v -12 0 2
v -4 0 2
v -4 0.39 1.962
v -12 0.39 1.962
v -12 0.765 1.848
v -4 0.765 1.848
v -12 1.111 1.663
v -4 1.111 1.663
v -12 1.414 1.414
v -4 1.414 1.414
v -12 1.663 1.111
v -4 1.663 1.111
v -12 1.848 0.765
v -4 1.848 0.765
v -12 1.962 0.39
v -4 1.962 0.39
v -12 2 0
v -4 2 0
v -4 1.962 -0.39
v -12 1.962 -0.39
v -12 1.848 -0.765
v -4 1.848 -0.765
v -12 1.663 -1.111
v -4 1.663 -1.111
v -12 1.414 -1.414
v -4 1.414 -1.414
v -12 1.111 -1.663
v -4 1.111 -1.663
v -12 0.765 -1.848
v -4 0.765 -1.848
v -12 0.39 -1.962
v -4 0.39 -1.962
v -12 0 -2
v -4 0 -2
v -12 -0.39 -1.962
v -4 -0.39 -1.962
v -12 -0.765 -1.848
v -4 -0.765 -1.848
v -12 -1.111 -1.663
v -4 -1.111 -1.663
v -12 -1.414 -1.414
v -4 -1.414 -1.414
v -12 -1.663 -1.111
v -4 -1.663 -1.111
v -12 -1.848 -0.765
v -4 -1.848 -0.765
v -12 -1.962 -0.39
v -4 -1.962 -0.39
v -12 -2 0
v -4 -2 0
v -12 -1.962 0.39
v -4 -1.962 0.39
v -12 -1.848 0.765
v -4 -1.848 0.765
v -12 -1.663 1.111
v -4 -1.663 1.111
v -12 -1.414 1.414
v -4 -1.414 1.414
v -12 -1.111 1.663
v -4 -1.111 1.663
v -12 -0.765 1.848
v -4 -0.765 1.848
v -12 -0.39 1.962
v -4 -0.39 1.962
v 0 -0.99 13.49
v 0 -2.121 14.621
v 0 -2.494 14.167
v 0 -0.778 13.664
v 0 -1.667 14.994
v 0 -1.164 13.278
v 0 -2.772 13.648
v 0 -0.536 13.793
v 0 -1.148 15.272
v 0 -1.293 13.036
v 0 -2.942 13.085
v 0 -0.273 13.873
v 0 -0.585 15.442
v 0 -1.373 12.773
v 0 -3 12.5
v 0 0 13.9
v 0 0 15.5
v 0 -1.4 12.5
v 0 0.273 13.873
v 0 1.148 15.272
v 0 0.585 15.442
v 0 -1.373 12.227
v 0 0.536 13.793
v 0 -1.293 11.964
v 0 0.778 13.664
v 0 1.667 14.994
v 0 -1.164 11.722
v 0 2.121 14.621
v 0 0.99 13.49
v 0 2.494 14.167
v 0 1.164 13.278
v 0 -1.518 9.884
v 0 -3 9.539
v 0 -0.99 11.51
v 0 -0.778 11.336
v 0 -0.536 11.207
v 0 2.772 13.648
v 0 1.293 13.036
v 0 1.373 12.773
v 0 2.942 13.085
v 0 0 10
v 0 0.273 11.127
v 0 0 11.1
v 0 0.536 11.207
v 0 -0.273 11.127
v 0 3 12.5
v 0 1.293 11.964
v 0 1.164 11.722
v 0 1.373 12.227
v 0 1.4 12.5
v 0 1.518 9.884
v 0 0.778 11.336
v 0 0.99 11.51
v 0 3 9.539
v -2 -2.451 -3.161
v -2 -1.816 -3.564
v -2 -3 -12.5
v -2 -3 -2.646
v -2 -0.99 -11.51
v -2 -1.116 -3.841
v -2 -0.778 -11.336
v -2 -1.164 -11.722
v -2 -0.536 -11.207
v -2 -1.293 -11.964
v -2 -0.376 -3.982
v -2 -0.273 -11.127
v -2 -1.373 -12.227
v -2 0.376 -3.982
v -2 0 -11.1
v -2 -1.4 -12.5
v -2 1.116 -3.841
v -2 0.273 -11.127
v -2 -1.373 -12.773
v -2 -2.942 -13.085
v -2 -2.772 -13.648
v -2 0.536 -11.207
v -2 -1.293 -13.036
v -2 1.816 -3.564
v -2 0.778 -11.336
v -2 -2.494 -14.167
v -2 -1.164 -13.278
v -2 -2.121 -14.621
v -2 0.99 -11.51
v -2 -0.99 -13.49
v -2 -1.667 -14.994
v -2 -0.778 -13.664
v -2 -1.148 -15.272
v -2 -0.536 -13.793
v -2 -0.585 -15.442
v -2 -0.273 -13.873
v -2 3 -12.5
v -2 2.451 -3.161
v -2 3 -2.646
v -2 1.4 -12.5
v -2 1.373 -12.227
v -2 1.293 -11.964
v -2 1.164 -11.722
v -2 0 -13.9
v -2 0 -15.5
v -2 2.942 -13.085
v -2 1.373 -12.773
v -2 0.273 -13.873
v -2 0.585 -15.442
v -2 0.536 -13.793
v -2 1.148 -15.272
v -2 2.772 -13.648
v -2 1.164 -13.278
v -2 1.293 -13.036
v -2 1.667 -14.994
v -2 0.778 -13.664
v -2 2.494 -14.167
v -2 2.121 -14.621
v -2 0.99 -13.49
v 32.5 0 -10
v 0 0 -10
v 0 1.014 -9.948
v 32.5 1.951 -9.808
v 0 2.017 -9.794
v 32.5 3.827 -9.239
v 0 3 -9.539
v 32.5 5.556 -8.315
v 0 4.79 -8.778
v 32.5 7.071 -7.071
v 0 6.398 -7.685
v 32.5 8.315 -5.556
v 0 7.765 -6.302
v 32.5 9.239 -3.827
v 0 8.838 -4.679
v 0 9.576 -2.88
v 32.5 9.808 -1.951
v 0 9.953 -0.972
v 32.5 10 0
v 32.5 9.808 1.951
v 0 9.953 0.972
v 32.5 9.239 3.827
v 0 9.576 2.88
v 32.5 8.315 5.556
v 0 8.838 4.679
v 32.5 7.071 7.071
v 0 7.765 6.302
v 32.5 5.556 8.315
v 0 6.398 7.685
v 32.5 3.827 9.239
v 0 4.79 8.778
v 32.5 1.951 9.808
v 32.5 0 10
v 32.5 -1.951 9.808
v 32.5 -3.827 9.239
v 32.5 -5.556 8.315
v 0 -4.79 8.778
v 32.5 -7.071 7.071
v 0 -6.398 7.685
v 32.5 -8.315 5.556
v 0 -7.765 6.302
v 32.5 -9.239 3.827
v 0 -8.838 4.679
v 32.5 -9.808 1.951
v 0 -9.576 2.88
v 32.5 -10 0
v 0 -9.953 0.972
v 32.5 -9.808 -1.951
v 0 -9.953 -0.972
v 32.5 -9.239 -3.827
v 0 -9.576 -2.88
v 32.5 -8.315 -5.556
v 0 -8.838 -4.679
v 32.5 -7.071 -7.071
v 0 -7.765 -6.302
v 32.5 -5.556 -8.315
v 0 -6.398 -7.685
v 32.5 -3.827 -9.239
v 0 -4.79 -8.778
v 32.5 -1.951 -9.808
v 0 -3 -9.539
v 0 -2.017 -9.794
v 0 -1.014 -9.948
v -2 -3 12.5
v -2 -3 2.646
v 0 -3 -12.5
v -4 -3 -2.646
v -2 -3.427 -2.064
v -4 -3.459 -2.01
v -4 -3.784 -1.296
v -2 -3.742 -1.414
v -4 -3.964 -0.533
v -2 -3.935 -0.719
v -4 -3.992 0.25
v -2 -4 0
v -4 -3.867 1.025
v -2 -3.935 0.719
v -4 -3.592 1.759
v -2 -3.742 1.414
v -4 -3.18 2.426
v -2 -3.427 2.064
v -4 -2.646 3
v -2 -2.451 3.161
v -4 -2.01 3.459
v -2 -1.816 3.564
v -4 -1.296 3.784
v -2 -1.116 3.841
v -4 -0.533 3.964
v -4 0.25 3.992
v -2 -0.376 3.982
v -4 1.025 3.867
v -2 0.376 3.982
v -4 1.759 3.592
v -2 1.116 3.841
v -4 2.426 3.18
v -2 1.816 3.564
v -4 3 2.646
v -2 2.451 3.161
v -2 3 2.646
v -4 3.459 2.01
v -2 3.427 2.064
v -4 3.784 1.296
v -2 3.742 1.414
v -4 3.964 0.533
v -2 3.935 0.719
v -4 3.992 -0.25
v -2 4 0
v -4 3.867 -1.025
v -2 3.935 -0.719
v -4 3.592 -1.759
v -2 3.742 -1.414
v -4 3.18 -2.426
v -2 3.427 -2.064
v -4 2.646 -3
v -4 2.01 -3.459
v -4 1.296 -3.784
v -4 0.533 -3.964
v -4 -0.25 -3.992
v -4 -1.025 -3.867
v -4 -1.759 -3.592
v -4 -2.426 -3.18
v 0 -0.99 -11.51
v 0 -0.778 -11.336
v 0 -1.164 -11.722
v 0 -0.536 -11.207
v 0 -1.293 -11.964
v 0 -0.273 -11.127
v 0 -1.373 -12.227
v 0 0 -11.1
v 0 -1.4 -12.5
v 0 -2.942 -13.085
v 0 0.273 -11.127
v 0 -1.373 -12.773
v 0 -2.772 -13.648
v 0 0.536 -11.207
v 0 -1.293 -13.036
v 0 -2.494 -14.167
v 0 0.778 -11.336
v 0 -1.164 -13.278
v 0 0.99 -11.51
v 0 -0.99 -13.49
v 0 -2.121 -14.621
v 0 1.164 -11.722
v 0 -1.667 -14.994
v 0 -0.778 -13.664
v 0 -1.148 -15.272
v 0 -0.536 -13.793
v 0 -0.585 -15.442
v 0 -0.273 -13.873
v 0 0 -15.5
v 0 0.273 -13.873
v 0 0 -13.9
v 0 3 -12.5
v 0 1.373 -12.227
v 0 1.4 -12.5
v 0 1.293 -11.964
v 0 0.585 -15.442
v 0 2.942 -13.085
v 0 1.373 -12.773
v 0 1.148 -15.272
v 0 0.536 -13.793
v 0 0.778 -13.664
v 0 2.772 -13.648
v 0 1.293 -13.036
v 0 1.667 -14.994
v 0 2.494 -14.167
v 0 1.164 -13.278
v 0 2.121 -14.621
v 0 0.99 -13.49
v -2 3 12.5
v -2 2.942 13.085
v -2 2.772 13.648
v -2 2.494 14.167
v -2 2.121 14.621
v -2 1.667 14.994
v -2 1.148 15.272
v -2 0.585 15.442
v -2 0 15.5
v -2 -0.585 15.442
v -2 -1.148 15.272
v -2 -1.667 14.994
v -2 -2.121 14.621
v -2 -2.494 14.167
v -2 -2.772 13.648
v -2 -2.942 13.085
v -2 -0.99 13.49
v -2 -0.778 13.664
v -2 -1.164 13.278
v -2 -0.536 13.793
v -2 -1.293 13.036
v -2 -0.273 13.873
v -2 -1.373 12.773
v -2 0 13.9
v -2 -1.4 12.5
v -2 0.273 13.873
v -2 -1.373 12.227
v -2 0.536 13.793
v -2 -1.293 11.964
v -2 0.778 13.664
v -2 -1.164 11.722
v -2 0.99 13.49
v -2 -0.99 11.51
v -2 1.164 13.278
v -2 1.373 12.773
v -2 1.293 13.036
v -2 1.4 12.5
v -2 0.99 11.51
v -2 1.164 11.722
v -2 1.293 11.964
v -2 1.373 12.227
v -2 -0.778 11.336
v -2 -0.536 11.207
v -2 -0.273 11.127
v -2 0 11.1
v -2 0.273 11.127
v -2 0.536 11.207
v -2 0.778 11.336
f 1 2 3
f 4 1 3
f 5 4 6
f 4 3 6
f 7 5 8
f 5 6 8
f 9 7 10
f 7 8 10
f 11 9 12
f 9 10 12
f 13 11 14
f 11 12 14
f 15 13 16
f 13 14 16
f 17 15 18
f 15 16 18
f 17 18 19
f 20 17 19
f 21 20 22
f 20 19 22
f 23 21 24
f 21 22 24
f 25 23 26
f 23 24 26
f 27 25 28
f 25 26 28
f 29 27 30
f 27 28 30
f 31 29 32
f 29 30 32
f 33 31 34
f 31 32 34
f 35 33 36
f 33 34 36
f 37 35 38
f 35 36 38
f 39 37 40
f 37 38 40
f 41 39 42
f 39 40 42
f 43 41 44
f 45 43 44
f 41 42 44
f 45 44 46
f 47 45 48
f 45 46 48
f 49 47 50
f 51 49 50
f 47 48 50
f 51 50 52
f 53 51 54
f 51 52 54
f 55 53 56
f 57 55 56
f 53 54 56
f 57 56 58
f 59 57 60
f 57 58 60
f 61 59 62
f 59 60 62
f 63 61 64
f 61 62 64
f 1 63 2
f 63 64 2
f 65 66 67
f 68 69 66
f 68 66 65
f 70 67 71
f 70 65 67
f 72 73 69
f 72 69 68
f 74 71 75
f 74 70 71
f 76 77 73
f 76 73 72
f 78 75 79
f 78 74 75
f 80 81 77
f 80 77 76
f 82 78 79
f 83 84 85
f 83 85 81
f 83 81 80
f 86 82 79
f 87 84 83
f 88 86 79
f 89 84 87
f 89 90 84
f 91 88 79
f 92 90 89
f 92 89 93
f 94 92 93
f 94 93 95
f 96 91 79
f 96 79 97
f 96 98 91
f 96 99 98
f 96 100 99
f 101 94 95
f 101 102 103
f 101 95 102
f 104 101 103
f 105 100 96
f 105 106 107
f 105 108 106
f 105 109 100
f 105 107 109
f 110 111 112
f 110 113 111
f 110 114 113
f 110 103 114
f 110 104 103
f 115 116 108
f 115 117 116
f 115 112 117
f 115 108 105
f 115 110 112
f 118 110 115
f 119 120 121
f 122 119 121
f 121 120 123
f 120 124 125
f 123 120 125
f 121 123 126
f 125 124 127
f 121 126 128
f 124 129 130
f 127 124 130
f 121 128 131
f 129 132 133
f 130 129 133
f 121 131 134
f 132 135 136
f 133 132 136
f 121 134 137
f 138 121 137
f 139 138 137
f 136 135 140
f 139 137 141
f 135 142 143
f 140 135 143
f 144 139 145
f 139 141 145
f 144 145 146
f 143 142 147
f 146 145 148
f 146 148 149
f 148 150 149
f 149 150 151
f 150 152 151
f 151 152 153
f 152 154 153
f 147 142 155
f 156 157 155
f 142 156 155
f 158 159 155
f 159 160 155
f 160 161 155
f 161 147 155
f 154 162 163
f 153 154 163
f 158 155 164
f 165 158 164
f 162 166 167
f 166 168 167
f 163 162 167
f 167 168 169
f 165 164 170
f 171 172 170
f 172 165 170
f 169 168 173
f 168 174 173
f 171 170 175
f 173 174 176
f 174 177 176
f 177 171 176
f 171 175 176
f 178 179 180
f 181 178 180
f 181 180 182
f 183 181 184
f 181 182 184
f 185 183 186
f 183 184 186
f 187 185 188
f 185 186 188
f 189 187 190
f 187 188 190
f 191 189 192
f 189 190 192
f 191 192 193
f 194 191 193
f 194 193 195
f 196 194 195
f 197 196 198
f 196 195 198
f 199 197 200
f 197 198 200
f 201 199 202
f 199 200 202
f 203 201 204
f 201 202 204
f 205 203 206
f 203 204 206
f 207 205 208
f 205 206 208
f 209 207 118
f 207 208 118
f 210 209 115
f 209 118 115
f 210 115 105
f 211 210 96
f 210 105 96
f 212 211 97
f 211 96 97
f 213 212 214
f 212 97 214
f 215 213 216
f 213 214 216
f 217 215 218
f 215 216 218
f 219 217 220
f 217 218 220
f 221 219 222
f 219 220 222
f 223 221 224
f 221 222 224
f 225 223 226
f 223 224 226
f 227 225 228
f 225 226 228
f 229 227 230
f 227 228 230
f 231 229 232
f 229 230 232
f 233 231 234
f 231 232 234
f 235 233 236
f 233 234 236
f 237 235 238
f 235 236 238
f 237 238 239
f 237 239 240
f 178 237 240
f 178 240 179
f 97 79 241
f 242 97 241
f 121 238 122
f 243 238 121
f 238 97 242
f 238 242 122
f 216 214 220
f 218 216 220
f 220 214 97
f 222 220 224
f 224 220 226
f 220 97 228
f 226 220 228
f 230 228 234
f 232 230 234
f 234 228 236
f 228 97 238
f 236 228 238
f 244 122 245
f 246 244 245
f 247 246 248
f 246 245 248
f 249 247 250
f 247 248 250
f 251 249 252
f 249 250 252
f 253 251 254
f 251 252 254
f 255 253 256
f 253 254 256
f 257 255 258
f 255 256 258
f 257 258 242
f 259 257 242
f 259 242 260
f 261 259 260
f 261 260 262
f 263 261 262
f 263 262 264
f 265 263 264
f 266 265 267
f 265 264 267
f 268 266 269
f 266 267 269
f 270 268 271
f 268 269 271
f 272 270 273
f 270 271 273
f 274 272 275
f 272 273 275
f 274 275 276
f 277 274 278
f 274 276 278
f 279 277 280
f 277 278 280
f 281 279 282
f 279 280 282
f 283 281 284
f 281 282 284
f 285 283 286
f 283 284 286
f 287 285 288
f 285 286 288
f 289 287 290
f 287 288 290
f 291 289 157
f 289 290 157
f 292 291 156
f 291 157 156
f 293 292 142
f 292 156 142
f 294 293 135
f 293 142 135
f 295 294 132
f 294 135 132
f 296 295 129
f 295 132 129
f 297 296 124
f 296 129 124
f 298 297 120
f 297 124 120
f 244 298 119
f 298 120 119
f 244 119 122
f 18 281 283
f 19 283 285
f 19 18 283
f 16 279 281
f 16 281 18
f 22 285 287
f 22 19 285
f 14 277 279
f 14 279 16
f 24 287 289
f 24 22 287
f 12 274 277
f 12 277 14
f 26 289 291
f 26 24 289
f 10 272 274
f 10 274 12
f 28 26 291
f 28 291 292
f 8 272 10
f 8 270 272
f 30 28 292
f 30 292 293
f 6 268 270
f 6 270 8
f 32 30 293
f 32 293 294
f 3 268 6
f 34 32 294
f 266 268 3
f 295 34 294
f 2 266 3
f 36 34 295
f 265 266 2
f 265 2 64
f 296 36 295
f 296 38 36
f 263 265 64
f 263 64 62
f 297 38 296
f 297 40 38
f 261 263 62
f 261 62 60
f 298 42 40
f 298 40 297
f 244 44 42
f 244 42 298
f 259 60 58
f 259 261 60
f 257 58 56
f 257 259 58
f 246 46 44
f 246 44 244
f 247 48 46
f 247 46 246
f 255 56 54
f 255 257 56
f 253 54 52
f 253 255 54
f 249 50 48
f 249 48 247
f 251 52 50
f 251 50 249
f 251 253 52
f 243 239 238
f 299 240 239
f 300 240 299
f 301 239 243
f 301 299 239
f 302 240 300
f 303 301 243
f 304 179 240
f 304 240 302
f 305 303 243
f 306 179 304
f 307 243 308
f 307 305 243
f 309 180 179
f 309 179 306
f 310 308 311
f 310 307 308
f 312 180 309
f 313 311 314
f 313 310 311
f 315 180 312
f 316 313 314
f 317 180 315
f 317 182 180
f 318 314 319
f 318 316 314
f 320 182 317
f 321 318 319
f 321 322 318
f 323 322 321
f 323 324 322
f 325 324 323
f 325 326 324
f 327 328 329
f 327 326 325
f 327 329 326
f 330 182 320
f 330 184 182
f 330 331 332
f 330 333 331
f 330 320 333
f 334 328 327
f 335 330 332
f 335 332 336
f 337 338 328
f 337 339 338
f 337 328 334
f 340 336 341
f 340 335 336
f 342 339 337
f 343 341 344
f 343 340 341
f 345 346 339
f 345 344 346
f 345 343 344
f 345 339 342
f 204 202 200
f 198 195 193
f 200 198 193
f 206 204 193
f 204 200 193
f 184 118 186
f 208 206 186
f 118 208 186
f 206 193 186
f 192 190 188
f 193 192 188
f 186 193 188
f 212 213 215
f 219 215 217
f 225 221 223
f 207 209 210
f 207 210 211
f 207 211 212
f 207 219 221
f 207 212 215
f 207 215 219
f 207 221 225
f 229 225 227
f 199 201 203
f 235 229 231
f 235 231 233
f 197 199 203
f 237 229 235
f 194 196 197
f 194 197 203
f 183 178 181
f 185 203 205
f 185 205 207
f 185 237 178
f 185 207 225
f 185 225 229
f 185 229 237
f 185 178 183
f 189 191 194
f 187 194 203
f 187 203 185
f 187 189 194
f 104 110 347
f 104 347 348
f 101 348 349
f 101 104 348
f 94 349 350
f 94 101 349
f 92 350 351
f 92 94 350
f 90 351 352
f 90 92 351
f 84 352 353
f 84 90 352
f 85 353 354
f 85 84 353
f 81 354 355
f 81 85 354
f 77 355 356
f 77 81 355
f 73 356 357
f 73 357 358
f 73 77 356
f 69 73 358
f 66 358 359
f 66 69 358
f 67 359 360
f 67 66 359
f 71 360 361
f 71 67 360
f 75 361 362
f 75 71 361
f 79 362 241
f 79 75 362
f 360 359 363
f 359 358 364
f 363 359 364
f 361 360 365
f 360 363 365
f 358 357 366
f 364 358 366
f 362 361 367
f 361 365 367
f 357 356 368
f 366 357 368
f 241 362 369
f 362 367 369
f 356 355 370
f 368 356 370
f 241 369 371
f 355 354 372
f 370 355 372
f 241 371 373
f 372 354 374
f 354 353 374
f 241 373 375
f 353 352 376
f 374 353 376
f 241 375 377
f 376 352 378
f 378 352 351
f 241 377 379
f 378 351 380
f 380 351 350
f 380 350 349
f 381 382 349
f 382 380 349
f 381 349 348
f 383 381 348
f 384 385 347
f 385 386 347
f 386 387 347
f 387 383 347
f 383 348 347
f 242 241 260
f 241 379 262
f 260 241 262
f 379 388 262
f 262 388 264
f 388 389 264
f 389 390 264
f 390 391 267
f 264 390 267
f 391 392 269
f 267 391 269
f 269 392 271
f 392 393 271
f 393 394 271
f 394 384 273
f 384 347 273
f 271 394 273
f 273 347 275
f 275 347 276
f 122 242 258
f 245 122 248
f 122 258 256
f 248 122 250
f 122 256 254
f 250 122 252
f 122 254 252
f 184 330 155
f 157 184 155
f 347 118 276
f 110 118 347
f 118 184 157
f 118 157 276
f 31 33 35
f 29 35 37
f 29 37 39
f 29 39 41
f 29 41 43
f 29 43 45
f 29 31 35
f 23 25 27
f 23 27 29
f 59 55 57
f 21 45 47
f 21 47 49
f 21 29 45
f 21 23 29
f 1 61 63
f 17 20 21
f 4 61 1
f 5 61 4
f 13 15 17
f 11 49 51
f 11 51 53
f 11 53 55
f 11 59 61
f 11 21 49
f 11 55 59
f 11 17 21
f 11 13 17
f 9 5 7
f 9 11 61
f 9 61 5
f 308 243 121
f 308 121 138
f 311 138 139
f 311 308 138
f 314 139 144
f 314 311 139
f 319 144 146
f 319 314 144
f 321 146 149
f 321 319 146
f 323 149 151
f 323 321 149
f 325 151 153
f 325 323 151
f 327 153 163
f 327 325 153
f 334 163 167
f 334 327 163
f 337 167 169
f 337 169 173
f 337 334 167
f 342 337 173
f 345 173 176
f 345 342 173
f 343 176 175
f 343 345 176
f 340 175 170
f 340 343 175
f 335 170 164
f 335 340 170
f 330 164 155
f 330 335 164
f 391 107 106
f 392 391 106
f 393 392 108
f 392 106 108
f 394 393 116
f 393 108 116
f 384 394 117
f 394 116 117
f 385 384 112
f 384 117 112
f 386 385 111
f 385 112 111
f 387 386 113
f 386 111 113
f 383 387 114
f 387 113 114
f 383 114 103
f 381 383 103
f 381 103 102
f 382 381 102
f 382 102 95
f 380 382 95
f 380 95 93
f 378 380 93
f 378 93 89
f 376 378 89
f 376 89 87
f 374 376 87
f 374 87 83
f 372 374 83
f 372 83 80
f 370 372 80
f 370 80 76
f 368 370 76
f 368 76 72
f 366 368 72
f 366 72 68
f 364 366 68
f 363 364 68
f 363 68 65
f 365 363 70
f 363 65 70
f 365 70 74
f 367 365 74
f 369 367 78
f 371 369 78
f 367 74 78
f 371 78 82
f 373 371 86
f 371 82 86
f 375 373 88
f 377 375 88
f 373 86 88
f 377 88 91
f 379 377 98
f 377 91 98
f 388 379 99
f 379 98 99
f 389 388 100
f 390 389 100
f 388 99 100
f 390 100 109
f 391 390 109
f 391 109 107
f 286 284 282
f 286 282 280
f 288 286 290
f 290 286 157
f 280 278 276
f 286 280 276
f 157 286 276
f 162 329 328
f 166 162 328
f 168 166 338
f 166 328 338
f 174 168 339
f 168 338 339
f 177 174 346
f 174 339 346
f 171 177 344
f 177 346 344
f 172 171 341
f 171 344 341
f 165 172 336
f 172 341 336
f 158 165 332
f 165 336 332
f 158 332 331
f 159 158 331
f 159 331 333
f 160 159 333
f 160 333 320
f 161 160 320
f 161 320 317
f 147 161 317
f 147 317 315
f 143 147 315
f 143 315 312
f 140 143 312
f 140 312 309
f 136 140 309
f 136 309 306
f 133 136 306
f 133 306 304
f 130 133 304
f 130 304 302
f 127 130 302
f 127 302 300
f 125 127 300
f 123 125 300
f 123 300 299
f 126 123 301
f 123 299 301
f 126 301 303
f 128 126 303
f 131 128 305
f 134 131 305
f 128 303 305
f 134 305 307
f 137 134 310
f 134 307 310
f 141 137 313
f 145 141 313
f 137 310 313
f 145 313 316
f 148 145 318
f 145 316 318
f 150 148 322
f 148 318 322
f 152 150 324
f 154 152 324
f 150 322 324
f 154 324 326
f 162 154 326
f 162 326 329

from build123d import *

# Parameters (mm, degrees)
SKETCH1_R                      = 10
BOSS_EXTRUDE1_DEPTH            = 32.5
BOSS_EXTRUDE2_DEPTH            = 2
F_2_8_2_8_DIAMETER_HOLE1_D     = 2.8
F_2_8_2_8_DIAMETER_HOLE1_DEPTH = 70
F_2_8_2_8_DIAMETER_HOLE1_TIP   = 0.841204867
SKETCH5_R                      = 4
BOSS_EXTRUDE3_DEPTH            = 2
SKETCH6_R                      = 2
BOSS_EXTRUDE4_DEPTH            = 8


with BuildPart() as part:
    # Sketch1 → Boss-Extrude1 (new body)
    with BuildSketch(Plane(origin=(0, 0, 0), x_dir=(0, 0, -1), z_dir=(1, 0, 0))):
        Circle(SKETCH1_R)
    extrude(amount=BOSS_EXTRUDE1_DEPTH)

    # Sketch2 → Boss-Extrude2 (add)
    with BuildSketch(Plane.ZY):
        with BuildLine():
            Line((-12.5, 3), (12.5, 3))
            ThreePointArc((12.5, 3), (15.5, 0), (12.5, -3))
            Line((12.5, -3), (-12.5, -3))
            ThreePointArc((-12.5, -3), (-15.5, 0), (-12.5, 3))
        make_face()
    extrude(amount=BOSS_EXTRUDE2_DEPTH)

    # Ø2.8 (2.8) Diameter Hole1
    with Locations(Plane.ZY.offset(2)):
        with Locations((-12.5, 0), (12.5, 0)):
            Hole(F_2_8_2_8_DIAMETER_HOLE1_D / 2, depth=F_2_8_2_8_DIAMETER_HOLE1_DEPTH)
            with Locations((0, 0, -(F_2_8_2_8_DIAMETER_HOLE1_DEPTH + F_2_8_2_8_DIAMETER_HOLE1_TIP / 2))):  # 118° drill point
                Cone(0, F_2_8_2_8_DIAMETER_HOLE1_D / 2, F_2_8_2_8_DIAMETER_HOLE1_TIP, mode=Mode.SUBTRACT)

    # Sketch5 → Boss-Extrude3 (add)
    with BuildSketch(Plane.ZY.offset(2)):
        with Locations(Location((0, 0, 0), (0, 0, 228.590377891))):
            Circle(SKETCH5_R)
    extrude(amount=BOSS_EXTRUDE3_DEPTH)

    # Sketch6 → Boss-Extrude4 (add)
    with BuildSketch(Plane.ZY.offset(4)):
        Circle(SKETCH6_R)
    extrude(amount=BOSS_EXTRUDE4_DEPTH)


solid = part.part
